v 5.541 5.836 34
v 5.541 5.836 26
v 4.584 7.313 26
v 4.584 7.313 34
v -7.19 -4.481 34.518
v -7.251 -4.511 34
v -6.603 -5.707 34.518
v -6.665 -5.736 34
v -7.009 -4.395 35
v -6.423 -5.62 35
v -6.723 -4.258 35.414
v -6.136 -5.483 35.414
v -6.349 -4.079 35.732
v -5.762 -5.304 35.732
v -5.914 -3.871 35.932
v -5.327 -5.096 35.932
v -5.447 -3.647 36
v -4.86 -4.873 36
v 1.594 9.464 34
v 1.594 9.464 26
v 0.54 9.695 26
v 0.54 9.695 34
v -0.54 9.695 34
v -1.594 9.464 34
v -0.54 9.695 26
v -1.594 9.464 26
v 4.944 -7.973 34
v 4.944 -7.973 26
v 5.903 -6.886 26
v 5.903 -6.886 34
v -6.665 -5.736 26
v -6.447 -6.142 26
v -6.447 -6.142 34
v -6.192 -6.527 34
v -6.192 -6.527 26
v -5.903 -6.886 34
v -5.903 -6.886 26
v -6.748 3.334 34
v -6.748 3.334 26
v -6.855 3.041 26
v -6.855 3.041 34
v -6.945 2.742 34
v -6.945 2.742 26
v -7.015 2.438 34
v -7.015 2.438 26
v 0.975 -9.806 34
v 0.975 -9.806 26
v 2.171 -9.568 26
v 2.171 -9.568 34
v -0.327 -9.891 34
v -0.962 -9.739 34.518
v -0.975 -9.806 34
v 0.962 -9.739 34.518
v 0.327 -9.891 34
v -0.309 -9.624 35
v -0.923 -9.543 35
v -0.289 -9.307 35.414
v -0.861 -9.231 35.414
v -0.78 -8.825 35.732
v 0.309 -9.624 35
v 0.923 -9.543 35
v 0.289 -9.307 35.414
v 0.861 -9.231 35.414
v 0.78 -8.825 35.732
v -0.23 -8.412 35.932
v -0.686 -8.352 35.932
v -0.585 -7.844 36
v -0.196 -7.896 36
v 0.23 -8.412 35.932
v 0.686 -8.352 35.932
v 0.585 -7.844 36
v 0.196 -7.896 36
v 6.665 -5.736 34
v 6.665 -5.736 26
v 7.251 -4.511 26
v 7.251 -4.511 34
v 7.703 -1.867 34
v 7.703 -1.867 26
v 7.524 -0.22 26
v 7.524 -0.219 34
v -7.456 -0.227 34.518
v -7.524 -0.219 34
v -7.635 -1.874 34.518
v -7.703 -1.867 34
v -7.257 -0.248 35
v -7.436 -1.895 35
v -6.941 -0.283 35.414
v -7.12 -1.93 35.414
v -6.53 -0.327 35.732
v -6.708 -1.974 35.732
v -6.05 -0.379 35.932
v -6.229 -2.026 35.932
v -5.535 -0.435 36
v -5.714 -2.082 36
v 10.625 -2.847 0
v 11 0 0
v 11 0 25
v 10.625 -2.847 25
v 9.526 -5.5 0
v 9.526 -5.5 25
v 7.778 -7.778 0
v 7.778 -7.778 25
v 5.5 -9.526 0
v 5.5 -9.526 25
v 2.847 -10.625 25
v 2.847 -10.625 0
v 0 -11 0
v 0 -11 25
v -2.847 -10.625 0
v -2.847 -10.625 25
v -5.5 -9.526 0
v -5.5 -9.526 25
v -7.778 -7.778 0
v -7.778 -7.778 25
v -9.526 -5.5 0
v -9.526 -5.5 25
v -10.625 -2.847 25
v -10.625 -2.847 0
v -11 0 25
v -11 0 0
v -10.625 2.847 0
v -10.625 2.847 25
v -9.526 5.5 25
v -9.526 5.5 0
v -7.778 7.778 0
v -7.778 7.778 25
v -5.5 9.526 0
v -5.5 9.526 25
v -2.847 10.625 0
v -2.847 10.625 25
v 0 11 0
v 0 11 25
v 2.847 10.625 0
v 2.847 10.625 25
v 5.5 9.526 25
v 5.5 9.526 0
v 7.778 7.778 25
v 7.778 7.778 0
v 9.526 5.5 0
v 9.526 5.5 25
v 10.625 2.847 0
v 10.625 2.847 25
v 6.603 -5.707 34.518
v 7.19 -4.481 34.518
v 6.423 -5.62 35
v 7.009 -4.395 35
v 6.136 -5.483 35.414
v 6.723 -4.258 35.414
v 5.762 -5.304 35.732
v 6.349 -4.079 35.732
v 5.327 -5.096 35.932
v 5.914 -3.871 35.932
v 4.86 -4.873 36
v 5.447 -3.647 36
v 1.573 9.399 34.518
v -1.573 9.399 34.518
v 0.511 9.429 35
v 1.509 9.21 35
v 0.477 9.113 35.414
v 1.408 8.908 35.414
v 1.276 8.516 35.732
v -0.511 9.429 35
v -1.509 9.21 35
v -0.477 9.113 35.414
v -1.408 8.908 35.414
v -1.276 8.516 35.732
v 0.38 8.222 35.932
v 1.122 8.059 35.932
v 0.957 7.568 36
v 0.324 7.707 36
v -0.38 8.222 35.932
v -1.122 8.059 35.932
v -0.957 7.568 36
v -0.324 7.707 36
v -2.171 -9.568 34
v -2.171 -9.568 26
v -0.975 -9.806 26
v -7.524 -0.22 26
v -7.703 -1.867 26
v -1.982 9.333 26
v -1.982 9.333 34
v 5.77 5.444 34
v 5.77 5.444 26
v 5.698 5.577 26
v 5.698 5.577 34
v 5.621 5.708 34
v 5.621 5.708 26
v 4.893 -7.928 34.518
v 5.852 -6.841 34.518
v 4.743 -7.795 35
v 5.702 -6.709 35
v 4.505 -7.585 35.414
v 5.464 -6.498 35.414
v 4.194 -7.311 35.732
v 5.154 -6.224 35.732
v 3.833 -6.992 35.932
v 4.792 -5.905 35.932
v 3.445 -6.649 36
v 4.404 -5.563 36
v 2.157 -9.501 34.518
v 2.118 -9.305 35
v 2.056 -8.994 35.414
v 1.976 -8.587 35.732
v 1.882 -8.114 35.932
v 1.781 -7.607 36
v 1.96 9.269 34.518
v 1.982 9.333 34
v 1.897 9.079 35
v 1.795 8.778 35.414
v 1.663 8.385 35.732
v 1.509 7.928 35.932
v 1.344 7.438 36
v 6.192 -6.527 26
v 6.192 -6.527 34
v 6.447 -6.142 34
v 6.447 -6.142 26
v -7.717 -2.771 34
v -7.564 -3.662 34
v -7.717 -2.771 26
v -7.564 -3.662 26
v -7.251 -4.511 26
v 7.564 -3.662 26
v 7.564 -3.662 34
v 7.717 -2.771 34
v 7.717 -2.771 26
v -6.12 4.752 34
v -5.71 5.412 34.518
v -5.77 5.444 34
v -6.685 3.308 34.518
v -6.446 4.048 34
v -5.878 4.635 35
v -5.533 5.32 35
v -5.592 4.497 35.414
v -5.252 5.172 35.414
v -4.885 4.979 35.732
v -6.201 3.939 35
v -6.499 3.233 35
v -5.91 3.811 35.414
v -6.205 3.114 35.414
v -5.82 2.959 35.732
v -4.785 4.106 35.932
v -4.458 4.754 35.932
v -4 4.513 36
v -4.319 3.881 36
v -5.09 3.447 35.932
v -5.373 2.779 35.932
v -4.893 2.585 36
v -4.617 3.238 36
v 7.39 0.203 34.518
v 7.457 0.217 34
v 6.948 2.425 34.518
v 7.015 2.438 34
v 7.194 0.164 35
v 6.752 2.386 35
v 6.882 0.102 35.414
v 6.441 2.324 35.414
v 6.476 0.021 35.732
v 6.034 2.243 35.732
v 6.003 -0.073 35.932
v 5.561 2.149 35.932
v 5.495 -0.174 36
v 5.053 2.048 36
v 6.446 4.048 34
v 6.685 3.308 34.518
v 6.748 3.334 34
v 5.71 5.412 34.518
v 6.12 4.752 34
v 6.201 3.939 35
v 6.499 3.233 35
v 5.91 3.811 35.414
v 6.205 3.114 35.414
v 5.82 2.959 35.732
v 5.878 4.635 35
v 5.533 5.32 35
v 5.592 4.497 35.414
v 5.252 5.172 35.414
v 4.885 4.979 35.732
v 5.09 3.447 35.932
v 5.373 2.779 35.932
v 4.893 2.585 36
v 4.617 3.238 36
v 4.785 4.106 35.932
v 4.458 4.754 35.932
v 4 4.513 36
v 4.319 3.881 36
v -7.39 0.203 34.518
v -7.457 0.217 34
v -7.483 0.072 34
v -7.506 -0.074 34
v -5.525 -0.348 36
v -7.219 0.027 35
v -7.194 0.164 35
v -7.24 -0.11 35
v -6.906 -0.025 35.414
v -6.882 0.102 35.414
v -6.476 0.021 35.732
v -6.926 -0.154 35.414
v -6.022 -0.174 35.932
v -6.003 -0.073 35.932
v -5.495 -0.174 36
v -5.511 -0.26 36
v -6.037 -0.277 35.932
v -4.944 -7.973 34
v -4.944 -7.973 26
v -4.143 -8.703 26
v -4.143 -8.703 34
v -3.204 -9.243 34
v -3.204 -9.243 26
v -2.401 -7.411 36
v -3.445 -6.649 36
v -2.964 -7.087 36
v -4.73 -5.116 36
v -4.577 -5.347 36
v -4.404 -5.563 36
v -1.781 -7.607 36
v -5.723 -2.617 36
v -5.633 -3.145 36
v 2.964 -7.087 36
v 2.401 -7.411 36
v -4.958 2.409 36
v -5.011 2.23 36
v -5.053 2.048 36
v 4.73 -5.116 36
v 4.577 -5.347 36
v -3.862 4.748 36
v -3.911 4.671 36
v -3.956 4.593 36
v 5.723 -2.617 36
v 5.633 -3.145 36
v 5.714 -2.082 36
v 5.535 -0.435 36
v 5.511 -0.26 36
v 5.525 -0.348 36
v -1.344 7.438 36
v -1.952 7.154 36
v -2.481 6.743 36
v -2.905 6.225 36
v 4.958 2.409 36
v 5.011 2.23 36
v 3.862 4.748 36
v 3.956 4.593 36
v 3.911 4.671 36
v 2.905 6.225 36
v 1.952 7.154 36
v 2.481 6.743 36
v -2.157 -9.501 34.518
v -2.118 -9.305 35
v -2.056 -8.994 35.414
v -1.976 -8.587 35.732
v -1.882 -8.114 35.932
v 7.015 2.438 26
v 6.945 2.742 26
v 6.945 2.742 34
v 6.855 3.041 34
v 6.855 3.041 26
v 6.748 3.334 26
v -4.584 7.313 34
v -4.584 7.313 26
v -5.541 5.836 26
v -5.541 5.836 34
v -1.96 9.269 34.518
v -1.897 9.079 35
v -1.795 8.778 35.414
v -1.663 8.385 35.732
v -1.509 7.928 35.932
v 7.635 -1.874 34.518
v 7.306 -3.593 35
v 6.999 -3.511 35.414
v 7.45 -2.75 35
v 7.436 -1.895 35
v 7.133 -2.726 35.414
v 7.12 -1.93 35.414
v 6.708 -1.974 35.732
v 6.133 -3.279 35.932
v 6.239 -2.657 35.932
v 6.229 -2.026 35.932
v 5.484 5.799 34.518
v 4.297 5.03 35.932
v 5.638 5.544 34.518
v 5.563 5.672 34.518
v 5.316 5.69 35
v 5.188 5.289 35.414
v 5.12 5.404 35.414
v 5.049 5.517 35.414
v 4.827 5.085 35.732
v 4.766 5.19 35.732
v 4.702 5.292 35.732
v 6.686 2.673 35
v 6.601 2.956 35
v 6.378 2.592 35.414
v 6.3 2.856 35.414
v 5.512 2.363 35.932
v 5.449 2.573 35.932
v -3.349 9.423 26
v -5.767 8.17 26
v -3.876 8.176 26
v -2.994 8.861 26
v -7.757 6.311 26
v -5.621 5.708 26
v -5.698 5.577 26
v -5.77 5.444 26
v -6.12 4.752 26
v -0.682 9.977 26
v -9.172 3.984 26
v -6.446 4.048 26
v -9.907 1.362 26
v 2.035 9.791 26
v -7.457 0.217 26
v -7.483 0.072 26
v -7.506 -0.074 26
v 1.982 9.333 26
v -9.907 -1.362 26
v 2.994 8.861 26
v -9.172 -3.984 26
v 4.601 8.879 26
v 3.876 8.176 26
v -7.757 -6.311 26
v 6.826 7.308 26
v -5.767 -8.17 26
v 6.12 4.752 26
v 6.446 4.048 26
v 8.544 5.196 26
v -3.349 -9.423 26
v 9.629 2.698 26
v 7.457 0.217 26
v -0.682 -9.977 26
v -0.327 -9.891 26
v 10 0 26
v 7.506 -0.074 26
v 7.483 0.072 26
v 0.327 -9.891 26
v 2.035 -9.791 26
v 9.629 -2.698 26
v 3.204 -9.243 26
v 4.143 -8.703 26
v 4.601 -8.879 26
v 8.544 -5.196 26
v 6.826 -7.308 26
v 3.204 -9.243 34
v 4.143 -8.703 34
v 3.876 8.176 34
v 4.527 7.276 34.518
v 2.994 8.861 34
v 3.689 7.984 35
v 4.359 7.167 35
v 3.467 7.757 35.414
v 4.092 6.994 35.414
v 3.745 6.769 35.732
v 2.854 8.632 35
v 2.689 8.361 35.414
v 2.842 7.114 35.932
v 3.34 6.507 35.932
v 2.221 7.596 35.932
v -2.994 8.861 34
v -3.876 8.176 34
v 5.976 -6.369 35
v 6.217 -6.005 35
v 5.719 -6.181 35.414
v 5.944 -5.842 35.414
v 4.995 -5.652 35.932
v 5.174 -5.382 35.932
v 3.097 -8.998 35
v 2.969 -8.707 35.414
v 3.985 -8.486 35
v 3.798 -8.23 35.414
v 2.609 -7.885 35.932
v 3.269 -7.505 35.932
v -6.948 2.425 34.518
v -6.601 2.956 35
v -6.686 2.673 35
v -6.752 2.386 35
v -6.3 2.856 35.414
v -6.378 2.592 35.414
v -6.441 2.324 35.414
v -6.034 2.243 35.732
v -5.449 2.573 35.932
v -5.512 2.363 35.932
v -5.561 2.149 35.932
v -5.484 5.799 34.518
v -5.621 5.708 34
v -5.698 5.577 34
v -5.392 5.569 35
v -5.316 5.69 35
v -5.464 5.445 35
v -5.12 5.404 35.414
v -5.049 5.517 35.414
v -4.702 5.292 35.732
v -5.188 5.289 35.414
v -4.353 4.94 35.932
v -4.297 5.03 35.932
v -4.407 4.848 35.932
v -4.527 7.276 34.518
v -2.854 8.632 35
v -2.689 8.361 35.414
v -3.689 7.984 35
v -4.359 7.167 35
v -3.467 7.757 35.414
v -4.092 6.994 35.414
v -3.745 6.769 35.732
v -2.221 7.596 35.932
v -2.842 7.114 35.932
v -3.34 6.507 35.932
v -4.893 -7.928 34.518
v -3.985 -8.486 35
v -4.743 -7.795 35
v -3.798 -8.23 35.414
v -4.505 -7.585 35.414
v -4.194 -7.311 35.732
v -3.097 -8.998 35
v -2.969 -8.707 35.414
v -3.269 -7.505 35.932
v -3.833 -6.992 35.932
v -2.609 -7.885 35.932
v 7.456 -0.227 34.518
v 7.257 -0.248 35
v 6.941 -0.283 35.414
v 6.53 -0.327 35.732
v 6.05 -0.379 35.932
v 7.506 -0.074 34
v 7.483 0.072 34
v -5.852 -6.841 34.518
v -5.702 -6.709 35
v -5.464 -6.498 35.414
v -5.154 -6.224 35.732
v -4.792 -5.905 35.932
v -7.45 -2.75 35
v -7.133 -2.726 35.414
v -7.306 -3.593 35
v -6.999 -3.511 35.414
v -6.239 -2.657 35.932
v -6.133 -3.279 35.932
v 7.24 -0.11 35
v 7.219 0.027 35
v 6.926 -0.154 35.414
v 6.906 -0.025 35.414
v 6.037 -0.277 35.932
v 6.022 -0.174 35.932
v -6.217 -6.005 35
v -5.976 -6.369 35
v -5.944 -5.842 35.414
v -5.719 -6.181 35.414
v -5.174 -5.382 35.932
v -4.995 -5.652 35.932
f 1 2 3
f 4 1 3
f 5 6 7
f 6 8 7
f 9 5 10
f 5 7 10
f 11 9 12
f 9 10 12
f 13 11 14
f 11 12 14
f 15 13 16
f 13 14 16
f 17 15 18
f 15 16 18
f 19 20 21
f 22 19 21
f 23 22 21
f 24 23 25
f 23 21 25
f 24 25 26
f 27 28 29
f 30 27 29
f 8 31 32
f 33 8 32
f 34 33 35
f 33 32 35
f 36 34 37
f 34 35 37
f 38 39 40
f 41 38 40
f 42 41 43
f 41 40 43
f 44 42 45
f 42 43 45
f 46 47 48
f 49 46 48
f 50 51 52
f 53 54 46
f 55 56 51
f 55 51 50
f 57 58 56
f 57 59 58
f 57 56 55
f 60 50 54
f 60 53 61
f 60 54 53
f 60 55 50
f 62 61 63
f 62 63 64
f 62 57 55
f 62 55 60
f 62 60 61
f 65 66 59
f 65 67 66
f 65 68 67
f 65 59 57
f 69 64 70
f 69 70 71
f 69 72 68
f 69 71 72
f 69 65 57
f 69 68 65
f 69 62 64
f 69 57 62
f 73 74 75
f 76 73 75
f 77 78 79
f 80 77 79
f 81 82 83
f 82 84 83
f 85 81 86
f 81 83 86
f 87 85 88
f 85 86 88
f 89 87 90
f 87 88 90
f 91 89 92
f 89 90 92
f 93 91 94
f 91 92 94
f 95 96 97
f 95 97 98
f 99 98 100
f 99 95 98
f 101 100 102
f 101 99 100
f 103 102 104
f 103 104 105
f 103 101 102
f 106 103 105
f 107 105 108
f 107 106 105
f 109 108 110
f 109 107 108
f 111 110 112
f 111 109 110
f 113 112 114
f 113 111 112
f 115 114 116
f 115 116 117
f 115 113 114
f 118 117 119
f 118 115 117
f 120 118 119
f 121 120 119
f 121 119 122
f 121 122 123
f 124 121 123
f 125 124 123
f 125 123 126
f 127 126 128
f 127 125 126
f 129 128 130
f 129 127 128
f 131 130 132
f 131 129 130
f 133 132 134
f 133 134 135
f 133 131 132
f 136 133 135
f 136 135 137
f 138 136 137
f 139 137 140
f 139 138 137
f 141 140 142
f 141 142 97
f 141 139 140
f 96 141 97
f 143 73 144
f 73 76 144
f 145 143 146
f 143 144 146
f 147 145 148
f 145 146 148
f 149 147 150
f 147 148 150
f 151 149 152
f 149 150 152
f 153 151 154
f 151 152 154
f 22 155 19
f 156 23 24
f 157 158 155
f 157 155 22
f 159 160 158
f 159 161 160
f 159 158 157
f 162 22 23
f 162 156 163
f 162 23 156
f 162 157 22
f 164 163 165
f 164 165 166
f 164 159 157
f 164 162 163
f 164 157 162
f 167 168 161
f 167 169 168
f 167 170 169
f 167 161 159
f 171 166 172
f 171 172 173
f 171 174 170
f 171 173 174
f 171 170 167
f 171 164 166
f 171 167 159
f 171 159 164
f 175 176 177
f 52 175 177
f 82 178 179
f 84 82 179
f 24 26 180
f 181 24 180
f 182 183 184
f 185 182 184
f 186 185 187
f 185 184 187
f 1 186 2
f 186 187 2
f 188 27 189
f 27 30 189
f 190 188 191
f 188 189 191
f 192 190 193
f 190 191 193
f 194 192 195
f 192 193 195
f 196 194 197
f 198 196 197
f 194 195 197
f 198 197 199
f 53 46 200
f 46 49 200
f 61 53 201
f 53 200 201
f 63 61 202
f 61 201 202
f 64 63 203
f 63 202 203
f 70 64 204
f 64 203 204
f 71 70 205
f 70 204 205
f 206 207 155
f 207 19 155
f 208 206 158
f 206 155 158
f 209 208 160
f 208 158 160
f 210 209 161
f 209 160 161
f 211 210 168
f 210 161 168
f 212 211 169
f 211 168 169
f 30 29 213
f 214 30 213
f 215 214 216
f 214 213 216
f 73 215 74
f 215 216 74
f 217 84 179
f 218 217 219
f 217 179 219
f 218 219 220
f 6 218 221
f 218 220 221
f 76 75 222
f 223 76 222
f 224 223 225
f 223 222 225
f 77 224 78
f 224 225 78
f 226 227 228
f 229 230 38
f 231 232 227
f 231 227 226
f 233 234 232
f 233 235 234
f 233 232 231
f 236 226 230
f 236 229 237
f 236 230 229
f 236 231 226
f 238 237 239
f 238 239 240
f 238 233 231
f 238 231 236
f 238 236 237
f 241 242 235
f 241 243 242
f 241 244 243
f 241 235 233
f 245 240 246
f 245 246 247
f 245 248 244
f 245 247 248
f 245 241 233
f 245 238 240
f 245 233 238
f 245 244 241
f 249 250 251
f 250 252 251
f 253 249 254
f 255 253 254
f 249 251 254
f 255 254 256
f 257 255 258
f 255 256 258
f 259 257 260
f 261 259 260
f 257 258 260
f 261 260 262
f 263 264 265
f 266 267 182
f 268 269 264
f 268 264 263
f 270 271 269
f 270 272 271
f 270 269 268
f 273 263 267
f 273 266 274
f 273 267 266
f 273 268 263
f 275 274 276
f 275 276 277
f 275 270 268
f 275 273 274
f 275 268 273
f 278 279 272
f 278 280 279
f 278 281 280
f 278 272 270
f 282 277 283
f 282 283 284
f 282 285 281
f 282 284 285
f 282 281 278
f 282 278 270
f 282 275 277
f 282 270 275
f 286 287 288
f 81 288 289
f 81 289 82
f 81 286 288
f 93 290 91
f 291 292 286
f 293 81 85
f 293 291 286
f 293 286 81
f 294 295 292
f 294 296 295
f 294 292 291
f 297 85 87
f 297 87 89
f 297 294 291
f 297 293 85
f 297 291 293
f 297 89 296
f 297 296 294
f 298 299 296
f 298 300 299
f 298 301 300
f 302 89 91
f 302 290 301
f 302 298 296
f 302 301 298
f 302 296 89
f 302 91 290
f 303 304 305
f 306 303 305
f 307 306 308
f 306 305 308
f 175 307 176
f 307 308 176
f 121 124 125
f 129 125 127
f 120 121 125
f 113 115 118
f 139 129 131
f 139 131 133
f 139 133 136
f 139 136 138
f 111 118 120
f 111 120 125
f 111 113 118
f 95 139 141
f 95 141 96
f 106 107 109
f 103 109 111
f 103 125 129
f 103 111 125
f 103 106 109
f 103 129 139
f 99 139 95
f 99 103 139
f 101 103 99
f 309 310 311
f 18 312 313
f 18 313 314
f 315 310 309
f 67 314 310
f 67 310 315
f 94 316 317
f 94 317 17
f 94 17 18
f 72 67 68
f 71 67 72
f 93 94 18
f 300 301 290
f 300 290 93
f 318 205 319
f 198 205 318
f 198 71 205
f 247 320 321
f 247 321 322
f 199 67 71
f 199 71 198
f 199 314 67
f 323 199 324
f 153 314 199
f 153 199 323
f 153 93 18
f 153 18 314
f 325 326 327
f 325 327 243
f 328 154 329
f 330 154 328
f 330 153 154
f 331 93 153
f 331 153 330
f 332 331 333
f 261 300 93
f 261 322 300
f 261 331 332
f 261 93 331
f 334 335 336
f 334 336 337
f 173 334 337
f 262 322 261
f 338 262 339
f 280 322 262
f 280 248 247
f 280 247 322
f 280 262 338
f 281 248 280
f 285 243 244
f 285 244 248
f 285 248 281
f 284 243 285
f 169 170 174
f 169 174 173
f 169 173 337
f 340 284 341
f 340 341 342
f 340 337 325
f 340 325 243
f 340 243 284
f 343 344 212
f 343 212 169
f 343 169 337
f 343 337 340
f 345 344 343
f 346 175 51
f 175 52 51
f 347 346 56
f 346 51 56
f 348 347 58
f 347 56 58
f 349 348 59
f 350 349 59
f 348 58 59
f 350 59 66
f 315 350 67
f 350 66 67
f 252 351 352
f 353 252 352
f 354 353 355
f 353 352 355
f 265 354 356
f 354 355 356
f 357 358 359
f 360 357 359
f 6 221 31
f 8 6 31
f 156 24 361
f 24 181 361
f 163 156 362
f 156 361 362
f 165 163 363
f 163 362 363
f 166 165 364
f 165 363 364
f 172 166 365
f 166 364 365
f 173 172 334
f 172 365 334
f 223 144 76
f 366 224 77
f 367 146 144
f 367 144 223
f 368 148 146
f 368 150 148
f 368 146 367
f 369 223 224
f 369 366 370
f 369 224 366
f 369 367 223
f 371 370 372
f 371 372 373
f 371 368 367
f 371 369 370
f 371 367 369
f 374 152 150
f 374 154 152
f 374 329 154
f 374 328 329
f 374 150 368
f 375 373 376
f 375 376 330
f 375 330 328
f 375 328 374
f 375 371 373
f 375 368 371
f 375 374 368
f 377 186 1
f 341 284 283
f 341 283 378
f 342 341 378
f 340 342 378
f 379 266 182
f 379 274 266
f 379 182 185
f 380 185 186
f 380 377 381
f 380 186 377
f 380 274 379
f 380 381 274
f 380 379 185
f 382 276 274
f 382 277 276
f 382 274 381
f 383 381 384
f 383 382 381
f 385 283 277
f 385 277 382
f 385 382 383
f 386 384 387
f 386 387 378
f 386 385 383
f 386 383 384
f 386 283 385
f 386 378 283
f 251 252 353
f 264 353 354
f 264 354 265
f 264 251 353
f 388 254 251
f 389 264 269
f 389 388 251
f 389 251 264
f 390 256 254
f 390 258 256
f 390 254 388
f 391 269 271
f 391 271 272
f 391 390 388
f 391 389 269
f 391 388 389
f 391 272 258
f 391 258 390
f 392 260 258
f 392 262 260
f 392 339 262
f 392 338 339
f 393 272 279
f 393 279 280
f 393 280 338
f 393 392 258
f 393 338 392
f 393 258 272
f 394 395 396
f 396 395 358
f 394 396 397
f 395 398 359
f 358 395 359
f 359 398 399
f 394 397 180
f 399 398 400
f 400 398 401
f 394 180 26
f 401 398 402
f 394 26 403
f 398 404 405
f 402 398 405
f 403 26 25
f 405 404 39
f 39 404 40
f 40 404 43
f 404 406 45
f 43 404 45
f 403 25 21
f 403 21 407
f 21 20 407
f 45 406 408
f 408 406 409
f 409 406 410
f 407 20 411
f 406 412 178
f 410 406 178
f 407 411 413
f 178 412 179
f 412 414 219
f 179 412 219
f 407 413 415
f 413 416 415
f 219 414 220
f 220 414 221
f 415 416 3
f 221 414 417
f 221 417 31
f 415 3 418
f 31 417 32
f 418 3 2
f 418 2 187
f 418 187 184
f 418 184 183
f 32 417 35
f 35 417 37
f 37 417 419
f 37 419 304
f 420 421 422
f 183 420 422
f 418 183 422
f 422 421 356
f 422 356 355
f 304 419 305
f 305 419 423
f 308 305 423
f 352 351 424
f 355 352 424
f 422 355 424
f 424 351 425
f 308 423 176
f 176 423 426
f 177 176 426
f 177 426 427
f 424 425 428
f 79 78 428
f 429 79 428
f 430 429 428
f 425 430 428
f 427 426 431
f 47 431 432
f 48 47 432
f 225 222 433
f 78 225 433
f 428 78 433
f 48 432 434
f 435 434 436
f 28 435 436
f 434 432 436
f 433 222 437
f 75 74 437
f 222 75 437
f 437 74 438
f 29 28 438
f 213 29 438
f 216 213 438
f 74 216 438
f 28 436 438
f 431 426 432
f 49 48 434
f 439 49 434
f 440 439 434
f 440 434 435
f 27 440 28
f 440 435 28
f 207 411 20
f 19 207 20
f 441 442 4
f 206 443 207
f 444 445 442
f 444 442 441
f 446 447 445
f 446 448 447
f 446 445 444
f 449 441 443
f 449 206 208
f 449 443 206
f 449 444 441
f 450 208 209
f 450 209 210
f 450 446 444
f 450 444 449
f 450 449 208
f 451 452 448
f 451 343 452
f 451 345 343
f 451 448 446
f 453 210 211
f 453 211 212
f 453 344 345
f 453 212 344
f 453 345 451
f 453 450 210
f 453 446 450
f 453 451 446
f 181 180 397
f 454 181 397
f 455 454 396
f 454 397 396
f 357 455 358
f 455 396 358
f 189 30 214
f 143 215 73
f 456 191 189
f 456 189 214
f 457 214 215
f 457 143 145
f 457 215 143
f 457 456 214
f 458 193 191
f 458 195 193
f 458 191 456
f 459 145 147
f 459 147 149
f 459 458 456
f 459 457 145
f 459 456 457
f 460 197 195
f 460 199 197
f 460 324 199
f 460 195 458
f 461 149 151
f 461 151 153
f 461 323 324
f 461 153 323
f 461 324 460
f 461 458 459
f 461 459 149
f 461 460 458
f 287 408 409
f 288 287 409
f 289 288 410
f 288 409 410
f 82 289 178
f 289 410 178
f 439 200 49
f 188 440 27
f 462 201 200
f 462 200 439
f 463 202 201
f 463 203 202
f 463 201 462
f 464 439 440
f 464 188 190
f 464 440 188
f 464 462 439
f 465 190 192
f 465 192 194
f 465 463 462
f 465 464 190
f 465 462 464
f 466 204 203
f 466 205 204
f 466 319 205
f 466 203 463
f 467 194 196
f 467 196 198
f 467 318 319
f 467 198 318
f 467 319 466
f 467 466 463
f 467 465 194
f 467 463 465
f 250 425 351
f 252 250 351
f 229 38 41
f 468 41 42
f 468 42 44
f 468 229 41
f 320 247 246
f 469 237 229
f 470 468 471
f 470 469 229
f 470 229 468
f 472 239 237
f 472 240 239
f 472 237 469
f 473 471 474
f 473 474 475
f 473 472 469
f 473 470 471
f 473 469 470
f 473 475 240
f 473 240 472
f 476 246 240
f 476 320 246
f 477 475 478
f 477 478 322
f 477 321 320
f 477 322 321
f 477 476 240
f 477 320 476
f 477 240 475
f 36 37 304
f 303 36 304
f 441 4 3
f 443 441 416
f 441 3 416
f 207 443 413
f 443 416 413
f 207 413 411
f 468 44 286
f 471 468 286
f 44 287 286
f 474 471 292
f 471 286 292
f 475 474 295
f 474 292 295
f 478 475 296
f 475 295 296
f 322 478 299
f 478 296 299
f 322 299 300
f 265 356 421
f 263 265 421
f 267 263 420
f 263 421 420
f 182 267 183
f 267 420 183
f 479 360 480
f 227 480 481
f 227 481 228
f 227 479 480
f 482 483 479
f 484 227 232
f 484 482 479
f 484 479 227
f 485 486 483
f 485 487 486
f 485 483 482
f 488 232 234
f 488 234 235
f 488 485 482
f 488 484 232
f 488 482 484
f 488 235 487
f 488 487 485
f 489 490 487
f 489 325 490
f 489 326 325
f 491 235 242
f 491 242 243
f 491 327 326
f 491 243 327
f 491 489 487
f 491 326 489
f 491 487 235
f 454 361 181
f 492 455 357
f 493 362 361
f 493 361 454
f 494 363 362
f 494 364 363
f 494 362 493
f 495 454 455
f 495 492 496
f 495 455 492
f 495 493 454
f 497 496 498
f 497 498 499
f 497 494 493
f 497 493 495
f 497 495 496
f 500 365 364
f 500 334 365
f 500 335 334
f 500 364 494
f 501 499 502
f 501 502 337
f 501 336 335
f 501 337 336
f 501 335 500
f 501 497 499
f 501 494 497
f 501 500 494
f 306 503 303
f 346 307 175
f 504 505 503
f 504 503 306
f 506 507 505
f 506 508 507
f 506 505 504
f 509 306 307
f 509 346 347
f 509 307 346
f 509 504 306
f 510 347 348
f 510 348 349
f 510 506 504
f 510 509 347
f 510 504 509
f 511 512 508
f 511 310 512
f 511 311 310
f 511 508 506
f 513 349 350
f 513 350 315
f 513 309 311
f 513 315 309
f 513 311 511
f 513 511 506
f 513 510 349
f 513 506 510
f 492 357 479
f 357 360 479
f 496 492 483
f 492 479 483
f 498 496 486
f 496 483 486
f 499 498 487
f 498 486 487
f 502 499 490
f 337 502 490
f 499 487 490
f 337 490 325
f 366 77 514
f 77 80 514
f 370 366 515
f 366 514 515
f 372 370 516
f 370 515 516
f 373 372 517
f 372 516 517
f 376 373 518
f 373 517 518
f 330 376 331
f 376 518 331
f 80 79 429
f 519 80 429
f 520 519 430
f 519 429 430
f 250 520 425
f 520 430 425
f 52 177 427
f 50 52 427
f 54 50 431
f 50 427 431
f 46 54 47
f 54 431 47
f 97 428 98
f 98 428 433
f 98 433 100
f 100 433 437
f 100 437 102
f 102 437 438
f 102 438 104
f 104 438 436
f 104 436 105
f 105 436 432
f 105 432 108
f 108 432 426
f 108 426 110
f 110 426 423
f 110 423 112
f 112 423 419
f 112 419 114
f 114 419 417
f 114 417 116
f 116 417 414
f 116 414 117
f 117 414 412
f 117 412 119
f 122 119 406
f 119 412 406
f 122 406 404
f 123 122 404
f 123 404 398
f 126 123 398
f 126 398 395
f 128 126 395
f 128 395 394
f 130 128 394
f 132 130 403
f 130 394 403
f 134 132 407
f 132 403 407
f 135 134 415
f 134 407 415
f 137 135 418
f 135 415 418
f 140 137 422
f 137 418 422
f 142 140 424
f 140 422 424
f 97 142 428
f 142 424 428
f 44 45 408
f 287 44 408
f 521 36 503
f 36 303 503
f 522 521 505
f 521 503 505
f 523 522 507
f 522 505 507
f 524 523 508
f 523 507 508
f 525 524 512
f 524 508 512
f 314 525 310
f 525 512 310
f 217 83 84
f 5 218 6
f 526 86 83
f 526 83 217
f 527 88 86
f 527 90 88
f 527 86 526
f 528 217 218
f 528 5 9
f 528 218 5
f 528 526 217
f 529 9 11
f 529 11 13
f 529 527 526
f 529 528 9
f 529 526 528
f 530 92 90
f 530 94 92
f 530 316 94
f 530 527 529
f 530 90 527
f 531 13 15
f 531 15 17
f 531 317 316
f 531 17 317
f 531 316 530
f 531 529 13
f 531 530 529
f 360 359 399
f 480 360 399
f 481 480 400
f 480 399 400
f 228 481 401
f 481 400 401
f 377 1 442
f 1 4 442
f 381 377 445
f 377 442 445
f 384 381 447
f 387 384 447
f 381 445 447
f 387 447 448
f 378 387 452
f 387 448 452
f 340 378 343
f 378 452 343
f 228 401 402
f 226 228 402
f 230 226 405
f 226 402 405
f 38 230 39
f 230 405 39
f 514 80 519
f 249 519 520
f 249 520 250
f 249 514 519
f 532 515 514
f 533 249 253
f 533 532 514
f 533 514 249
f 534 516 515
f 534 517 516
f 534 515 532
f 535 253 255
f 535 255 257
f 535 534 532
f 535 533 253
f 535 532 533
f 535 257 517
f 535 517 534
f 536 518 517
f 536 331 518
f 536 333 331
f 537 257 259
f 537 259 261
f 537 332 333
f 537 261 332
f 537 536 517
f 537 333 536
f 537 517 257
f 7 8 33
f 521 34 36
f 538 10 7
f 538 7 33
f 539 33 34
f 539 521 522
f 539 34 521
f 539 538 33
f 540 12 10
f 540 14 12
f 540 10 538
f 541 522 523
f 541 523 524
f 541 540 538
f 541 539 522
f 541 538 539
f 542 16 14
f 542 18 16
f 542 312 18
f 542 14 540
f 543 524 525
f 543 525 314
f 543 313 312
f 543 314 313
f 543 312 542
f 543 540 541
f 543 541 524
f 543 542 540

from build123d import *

# Parameters (mm, degrees)
F2_DEPTH = 36
F3_R     = 2
F4_R     = 11
F5_DEPTH = 26
F6_SIZE  = 1


with BuildPart() as f2:
    # F1 (on Top) → F2 (new body)
    with BuildSketch(Plane.XY):
        with BuildLine():
            Line((1.982116, 9.333126), (1.594405, 9.46357))
            ThreePointArc((1.594405, 9.46357), (0, 9.724596), (-1.594405, 9.46357))
            Line((-1.594405, 9.46357), (-1.982116, 9.333126))
            ThreePointArc((-1.982116, 9.333126), (-3.454217, 8.543398), (-4.584004, 7.312814))
            Line((-4.584004, 7.312814), (-5.540871, 5.835876))
            ThreePointArc((-5.540871, 5.835876), (-5.659922, 5.642646), (-5.770081, 5.444212))
            ThreePointArc((-5.770081, 5.444212), (-6.285484, 4.401197), (-6.747831, 3.333603))
            ThreePointArc((-6.747831, 3.333603), (-6.902422, 2.892031), (-7.015063, 2.437942))
            Line((-7.015063, 2.437942), (-7.456926, 0.216547))
            ThreePointArc((-7.456926, 0.216547), (-7.495184, -0.000739), (-7.523819, -0.2195))
            Line((-7.523819, -0.2195), (-7.702549, -1.866568))
            ThreePointArc((-7.702549, -1.866568), (-7.661217, -3.220061), (-7.251011, -4.510557))
            Line((-7.251011, -4.510557), (-6.664507, -5.735999))
            ThreePointArc((-6.664507, -5.735999), (-6.323741, -6.337337), (-5.903302, -6.885936))
            Line((-5.903302, -6.885936), (-4.94414, -7.972769))
            ThreePointArc((-4.94414, -7.972769), (-3.688499, -8.998323), (-2.170731, -9.568215))
            Line((-2.170731, -9.568215), (-0.975452, -9.805971))
            ThreePointArc((-0.975452, -9.805971), (0, -9.902044), (0.975452, -9.805971))
            Line((0.975452, -9.805971), (2.170731, -9.568215))
            ThreePointArc((2.170731, -9.568215), (3.688499, -8.998323), (4.94414, -7.972769))
            Line((4.94414, -7.972769), (5.903302, -6.885936))
            ThreePointArc((5.903302, -6.885936), (6.323741, -6.337337), (6.664507, -5.735999))
            Line((6.664507, -5.735999), (7.251011, -4.510557))
            ThreePointArc((7.251011, -4.510557), (7.661217, -3.220061), (7.702549, -1.866568))
            Line((7.702549, -1.866568), (7.523819, -0.2195))
            ThreePointArc((7.523819, -0.2195), (7.495184, -0.000739), (7.456926, 0.216547))
            Line((7.456926, 0.216547), (7.015063, 2.437942))
            ThreePointArc((7.015063, 2.437942), (6.902422, 2.892031), (6.747831, 3.333603))
            ThreePointArc((6.747831, 3.333603), (6.285484, 4.401197), (5.770081, 5.444212))
            ThreePointArc((5.770081, 5.444212), (5.659922, 5.642646), (5.540871, 5.835876))
            Line((5.540871, 5.835876), (4.584004, 7.312814))
            ThreePointArc((4.584004, 7.312814), (3.454217, 8.543398), (1.982116, 9.333126))
        make_face()
    extrude(amount=F2_DEPTH)

    # F3
    f3_edges = [f2.edges().sort_by_distance(p)[0] for p in [
        (3.688499, -8.998323, 36),
    ]]
    fillet(f3_edges, radius=F3_R)

    # F4 (on face) → F5 (join)
    with BuildSketch(Plane(origin=(0, 0, 0), x_dir=(1, 0, 0), z_dir=(0, 0, -1))):
        Circle(F4_R)
        with BuildLine():
            ThreePointArc((-7.702549, 1.866568), (-7.661217, 3.220061), (-7.251011, 4.510557))
            Line((-7.251011, 4.510557), (-6.664507, 5.735999))
            ThreePointArc((-6.664507, 5.735999), (-6.323741, 6.337337), (-5.903302, 6.885936))
            Line((-5.903302, 6.885936), (-4.94414, 7.972769))
            ThreePointArc((-4.94414, 7.972769), (-3.688499, 8.998323), (-2.170731, 9.568215))
            Line((-2.170731, 9.568215), (-0.975452, 9.805971))
            ThreePointArc((-0.975452, 9.805971), (0, 9.902044), (0.975452, 9.805971))
            Line((0.975452, 9.805971), (2.170731, 9.568215))
            ThreePointArc((2.170731, 9.568215), (3.688499, 8.998323), (4.94414, 7.972769))
            Line((4.94414, 7.972769), (5.903302, 6.885936))
            ThreePointArc((5.903302, 6.885936), (6.323741, 6.337337), (6.664507, 5.735999))
            Line((6.664507, 5.735999), (7.251011, 4.510557))
            ThreePointArc((7.251011, 4.510557), (7.661217, 3.220061), (7.702549, 1.866568))
            Line((7.702549, 1.866568), (7.523819, 0.2195))
            ThreePointArc((7.523819, 0.2195), (7.495184, 0.000739), (7.456926, -0.216547))
            Line((7.456926, -0.216547), (7.015063, -2.437942))
            ThreePointArc((7.015063, -2.437942), (6.902422, -2.892031), (6.747831, -3.333603))
            ThreePointArc((6.747831, -3.333603), (6.285484, -4.401197), (5.770081, -5.444212))
            ThreePointArc((5.770081, -5.444212), (5.659922, -5.642646), (5.540871, -5.835876))
            Line((5.540871, -5.835876), (4.584004, -7.312814))
            ThreePointArc((4.584004, -7.312814), (3.454217, -8.543398), (1.982116, -9.333126))
            Line((1.982116, -9.333126), (1.594405, -9.46357))
            ThreePointArc((1.594405, -9.46357), (0, -9.724596), (-1.594405, -9.46357))
            Line((-1.594405, -9.46357), (-1.982116, -9.333126))
            ThreePointArc((-1.982116, -9.333126), (-3.454217, -8.543398), (-4.584004, -7.312814))
            Line((-4.584004, -7.312814), (-5.540871, -5.835876))
            ThreePointArc((-5.540871, -5.835876), (-5.659922, -5.642646), (-5.770081, -5.444212))
            ThreePointArc((-5.770081, -5.444212), (-6.285484, -4.401197), (-6.747831, -3.333603))
            ThreePointArc((-6.747831, -3.333603), (-6.902422, -2.892031), (-7.015063, -2.437942))
            Line((-7.015063, -2.437942), (-7.456926, -0.216547))
            ThreePointArc((-7.456926, -0.216547), (-7.495184, 0.000739), (-7.523819, 0.2195))
            Line((-7.523819, 0.2195), (-7.702549, 1.866568))
        make_face(mode=Mode.SUBTRACT)
    extrude(amount=-F5_DEPTH)

    # F6
    f6_edges = [f2.edges().sort_by_distance(p)[0] for p in [
        (-11, 0, 26),
    ]]
    chamfer(f6_edges, length=F6_SIZE)


solid = f2.part
